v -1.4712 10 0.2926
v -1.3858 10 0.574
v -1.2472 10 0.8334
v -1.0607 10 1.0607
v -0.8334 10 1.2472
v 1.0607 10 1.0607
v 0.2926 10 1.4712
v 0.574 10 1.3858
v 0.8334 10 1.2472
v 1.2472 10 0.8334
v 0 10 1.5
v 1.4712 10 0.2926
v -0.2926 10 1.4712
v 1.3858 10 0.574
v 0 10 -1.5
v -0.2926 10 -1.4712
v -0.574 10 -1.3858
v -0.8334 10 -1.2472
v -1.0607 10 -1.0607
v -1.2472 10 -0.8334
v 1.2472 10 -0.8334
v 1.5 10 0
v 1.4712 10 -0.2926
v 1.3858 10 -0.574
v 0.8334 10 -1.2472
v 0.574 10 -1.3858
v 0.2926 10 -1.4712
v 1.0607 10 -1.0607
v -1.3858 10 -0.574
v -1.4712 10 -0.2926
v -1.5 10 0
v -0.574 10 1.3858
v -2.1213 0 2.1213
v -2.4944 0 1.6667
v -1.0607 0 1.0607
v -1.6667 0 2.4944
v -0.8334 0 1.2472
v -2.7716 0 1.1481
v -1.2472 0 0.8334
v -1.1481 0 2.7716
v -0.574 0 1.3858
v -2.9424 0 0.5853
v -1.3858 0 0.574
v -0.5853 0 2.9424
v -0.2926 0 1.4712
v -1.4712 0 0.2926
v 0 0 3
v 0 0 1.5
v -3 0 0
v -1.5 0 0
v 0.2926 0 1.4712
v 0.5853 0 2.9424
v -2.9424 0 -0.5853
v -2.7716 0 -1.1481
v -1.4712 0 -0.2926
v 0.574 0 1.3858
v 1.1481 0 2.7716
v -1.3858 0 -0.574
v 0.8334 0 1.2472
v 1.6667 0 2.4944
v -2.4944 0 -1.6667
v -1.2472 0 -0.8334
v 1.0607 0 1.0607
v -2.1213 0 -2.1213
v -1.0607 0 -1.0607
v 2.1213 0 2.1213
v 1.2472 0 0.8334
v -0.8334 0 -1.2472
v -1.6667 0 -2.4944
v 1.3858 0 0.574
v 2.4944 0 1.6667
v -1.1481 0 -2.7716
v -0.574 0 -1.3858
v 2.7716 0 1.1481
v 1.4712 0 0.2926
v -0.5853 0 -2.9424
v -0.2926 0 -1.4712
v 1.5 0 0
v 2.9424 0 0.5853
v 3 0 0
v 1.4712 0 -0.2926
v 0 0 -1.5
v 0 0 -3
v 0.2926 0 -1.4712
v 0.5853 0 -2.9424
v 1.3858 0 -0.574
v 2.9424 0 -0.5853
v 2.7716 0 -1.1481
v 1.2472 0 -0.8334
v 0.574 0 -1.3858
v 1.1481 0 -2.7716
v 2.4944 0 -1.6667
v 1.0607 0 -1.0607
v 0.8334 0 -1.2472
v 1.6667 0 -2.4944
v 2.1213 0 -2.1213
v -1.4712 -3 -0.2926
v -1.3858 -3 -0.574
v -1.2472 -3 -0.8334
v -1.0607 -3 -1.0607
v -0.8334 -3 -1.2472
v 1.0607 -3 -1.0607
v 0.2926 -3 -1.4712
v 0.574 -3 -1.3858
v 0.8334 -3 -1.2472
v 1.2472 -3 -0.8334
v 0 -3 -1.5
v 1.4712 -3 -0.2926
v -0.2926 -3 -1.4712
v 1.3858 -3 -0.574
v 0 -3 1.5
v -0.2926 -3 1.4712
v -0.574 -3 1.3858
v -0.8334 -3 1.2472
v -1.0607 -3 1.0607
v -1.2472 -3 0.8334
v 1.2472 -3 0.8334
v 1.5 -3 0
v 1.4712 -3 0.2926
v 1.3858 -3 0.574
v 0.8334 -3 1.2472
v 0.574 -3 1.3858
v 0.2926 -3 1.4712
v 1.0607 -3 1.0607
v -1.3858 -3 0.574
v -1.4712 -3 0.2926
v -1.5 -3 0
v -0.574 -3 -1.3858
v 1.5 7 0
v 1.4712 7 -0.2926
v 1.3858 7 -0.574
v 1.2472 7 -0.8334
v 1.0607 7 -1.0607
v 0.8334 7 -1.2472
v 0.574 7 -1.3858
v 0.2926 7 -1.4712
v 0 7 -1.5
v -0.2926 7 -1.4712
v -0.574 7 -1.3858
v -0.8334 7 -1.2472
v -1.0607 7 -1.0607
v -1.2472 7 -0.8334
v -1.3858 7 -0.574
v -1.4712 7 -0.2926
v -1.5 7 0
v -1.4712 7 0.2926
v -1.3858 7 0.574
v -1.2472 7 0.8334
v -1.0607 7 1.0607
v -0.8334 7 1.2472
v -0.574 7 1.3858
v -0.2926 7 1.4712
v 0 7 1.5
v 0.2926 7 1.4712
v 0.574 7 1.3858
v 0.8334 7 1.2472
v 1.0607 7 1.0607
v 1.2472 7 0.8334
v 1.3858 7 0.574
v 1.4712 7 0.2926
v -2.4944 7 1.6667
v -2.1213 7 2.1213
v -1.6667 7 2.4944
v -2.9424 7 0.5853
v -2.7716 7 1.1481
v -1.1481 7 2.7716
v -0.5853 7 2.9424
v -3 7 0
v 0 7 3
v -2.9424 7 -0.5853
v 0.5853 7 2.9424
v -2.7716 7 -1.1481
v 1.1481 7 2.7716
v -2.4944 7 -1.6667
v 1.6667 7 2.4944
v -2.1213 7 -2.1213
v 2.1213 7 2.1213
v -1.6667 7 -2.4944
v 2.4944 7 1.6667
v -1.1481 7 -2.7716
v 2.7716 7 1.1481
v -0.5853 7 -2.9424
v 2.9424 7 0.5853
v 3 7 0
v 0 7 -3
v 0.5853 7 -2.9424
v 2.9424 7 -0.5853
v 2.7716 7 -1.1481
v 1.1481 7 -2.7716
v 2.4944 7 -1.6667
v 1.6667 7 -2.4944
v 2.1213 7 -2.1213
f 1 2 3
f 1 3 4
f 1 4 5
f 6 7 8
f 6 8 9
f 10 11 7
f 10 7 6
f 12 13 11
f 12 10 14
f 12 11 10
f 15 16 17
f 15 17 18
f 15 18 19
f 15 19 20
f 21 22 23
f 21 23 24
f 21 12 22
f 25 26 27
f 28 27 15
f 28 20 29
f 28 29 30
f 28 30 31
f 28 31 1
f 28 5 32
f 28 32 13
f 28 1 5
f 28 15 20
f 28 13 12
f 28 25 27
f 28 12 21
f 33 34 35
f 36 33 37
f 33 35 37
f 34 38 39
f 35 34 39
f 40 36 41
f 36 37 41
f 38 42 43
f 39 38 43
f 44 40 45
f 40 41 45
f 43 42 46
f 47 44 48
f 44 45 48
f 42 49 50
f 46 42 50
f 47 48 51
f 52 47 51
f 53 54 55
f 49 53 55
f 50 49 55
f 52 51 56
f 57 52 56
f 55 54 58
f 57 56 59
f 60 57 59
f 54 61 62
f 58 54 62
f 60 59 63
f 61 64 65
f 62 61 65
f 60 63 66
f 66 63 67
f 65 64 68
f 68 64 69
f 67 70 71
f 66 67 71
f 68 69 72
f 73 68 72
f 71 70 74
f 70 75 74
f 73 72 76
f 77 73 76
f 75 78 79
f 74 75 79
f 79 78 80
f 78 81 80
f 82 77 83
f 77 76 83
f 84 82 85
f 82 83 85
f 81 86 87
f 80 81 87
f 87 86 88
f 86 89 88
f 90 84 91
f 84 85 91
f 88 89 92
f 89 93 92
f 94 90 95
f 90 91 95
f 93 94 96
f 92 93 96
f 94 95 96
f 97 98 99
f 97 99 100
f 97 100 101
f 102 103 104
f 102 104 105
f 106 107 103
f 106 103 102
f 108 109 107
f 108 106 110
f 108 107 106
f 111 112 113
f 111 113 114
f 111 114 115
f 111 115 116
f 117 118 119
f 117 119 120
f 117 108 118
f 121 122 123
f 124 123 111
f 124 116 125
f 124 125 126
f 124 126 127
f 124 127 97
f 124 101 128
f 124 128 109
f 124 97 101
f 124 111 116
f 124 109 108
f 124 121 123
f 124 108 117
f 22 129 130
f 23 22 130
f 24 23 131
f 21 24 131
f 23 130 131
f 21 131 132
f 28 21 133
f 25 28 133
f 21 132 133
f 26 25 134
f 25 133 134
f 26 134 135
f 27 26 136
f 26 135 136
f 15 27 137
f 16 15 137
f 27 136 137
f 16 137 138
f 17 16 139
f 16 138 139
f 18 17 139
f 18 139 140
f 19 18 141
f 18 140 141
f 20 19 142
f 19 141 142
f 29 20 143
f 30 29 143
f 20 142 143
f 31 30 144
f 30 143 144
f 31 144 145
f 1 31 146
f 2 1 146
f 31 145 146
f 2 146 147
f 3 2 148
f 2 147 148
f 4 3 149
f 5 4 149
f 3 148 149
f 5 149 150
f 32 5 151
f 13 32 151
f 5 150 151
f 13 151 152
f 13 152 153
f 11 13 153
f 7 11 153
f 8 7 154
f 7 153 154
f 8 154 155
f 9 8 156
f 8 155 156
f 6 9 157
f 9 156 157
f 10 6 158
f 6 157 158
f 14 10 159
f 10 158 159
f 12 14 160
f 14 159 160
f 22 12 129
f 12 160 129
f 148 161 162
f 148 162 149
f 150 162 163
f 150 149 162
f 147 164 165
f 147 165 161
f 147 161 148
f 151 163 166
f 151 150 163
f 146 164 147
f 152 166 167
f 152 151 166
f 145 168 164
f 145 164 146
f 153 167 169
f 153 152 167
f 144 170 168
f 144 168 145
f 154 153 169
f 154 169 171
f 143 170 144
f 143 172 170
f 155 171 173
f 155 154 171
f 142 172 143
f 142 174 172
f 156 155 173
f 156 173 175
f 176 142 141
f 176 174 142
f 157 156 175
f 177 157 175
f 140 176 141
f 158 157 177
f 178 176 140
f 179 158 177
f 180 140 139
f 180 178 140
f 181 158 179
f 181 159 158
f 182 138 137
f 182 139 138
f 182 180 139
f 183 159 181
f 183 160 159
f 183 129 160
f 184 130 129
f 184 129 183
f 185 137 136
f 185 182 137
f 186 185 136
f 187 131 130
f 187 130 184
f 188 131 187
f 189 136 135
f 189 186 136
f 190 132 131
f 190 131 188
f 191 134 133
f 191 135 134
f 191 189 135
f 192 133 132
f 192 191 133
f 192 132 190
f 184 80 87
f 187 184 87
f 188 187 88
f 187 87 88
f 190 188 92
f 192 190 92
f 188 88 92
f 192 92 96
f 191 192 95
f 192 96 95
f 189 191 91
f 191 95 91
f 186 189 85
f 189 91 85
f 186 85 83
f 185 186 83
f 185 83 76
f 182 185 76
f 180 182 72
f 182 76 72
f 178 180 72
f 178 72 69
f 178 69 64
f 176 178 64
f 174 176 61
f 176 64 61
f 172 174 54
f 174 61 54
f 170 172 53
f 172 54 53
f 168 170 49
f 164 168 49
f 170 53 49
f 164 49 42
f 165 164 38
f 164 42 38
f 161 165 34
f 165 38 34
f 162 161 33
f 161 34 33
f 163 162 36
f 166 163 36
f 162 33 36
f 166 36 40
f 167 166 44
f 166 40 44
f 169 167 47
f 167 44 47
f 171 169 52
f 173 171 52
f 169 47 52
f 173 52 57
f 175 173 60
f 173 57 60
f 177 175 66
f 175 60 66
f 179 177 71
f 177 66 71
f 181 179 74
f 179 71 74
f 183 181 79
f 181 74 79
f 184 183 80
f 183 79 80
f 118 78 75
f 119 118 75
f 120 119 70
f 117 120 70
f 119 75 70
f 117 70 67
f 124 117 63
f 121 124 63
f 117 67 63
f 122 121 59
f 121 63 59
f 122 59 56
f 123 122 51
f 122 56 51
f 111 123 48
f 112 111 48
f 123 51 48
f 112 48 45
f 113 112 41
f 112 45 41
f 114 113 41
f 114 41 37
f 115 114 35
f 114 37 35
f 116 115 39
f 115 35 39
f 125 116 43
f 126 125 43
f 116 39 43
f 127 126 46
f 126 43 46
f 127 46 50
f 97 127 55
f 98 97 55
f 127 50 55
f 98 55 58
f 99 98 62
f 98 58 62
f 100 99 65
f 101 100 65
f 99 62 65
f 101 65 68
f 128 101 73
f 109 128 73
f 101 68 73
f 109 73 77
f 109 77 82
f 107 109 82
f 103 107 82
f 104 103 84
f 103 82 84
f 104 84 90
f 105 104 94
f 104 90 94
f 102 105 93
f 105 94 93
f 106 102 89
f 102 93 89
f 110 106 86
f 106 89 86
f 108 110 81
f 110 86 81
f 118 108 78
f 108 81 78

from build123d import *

# Parameters (mm, degrees)
SKETCH_1_R      = 3
EXTRUDE_1_DEPTH = 7
SKETCH_2_R      = 1.5
EXTRUDE_2_DEPTH = 3
SKETCH_3_R      = 1.5
EXTRUDE_3_DEPTH = 3


with BuildPart() as part:
    # Эскиз1 → Бобышка-Вытянуть1 (new body)
    with BuildSketch(Plane(origin=(0, 0, 0), x_dir=(1, 0, 0), z_dir=(0, 1, 0))):
        Circle(SKETCH_1_R)
    extrude(amount=EXTRUDE_1_DEPTH)

    # Эскиз2 → Бобышка-Вытянуть2 (add)
    with BuildSketch(Plane.XZ):
        Circle(SKETCH_2_R)
    extrude(amount=EXTRUDE_2_DEPTH)

    # Эскиз3 → Бобышка-Вытянуть3 (add)
    with BuildSketch(Plane(origin=(0, 7, 0), x_dir=(1, 0, 0), z_dir=(0, 1, 0))):
        Circle(SKETCH_3_R)
    extrude(amount=EXTRUDE_3_DEPTH)


solid = part.part
